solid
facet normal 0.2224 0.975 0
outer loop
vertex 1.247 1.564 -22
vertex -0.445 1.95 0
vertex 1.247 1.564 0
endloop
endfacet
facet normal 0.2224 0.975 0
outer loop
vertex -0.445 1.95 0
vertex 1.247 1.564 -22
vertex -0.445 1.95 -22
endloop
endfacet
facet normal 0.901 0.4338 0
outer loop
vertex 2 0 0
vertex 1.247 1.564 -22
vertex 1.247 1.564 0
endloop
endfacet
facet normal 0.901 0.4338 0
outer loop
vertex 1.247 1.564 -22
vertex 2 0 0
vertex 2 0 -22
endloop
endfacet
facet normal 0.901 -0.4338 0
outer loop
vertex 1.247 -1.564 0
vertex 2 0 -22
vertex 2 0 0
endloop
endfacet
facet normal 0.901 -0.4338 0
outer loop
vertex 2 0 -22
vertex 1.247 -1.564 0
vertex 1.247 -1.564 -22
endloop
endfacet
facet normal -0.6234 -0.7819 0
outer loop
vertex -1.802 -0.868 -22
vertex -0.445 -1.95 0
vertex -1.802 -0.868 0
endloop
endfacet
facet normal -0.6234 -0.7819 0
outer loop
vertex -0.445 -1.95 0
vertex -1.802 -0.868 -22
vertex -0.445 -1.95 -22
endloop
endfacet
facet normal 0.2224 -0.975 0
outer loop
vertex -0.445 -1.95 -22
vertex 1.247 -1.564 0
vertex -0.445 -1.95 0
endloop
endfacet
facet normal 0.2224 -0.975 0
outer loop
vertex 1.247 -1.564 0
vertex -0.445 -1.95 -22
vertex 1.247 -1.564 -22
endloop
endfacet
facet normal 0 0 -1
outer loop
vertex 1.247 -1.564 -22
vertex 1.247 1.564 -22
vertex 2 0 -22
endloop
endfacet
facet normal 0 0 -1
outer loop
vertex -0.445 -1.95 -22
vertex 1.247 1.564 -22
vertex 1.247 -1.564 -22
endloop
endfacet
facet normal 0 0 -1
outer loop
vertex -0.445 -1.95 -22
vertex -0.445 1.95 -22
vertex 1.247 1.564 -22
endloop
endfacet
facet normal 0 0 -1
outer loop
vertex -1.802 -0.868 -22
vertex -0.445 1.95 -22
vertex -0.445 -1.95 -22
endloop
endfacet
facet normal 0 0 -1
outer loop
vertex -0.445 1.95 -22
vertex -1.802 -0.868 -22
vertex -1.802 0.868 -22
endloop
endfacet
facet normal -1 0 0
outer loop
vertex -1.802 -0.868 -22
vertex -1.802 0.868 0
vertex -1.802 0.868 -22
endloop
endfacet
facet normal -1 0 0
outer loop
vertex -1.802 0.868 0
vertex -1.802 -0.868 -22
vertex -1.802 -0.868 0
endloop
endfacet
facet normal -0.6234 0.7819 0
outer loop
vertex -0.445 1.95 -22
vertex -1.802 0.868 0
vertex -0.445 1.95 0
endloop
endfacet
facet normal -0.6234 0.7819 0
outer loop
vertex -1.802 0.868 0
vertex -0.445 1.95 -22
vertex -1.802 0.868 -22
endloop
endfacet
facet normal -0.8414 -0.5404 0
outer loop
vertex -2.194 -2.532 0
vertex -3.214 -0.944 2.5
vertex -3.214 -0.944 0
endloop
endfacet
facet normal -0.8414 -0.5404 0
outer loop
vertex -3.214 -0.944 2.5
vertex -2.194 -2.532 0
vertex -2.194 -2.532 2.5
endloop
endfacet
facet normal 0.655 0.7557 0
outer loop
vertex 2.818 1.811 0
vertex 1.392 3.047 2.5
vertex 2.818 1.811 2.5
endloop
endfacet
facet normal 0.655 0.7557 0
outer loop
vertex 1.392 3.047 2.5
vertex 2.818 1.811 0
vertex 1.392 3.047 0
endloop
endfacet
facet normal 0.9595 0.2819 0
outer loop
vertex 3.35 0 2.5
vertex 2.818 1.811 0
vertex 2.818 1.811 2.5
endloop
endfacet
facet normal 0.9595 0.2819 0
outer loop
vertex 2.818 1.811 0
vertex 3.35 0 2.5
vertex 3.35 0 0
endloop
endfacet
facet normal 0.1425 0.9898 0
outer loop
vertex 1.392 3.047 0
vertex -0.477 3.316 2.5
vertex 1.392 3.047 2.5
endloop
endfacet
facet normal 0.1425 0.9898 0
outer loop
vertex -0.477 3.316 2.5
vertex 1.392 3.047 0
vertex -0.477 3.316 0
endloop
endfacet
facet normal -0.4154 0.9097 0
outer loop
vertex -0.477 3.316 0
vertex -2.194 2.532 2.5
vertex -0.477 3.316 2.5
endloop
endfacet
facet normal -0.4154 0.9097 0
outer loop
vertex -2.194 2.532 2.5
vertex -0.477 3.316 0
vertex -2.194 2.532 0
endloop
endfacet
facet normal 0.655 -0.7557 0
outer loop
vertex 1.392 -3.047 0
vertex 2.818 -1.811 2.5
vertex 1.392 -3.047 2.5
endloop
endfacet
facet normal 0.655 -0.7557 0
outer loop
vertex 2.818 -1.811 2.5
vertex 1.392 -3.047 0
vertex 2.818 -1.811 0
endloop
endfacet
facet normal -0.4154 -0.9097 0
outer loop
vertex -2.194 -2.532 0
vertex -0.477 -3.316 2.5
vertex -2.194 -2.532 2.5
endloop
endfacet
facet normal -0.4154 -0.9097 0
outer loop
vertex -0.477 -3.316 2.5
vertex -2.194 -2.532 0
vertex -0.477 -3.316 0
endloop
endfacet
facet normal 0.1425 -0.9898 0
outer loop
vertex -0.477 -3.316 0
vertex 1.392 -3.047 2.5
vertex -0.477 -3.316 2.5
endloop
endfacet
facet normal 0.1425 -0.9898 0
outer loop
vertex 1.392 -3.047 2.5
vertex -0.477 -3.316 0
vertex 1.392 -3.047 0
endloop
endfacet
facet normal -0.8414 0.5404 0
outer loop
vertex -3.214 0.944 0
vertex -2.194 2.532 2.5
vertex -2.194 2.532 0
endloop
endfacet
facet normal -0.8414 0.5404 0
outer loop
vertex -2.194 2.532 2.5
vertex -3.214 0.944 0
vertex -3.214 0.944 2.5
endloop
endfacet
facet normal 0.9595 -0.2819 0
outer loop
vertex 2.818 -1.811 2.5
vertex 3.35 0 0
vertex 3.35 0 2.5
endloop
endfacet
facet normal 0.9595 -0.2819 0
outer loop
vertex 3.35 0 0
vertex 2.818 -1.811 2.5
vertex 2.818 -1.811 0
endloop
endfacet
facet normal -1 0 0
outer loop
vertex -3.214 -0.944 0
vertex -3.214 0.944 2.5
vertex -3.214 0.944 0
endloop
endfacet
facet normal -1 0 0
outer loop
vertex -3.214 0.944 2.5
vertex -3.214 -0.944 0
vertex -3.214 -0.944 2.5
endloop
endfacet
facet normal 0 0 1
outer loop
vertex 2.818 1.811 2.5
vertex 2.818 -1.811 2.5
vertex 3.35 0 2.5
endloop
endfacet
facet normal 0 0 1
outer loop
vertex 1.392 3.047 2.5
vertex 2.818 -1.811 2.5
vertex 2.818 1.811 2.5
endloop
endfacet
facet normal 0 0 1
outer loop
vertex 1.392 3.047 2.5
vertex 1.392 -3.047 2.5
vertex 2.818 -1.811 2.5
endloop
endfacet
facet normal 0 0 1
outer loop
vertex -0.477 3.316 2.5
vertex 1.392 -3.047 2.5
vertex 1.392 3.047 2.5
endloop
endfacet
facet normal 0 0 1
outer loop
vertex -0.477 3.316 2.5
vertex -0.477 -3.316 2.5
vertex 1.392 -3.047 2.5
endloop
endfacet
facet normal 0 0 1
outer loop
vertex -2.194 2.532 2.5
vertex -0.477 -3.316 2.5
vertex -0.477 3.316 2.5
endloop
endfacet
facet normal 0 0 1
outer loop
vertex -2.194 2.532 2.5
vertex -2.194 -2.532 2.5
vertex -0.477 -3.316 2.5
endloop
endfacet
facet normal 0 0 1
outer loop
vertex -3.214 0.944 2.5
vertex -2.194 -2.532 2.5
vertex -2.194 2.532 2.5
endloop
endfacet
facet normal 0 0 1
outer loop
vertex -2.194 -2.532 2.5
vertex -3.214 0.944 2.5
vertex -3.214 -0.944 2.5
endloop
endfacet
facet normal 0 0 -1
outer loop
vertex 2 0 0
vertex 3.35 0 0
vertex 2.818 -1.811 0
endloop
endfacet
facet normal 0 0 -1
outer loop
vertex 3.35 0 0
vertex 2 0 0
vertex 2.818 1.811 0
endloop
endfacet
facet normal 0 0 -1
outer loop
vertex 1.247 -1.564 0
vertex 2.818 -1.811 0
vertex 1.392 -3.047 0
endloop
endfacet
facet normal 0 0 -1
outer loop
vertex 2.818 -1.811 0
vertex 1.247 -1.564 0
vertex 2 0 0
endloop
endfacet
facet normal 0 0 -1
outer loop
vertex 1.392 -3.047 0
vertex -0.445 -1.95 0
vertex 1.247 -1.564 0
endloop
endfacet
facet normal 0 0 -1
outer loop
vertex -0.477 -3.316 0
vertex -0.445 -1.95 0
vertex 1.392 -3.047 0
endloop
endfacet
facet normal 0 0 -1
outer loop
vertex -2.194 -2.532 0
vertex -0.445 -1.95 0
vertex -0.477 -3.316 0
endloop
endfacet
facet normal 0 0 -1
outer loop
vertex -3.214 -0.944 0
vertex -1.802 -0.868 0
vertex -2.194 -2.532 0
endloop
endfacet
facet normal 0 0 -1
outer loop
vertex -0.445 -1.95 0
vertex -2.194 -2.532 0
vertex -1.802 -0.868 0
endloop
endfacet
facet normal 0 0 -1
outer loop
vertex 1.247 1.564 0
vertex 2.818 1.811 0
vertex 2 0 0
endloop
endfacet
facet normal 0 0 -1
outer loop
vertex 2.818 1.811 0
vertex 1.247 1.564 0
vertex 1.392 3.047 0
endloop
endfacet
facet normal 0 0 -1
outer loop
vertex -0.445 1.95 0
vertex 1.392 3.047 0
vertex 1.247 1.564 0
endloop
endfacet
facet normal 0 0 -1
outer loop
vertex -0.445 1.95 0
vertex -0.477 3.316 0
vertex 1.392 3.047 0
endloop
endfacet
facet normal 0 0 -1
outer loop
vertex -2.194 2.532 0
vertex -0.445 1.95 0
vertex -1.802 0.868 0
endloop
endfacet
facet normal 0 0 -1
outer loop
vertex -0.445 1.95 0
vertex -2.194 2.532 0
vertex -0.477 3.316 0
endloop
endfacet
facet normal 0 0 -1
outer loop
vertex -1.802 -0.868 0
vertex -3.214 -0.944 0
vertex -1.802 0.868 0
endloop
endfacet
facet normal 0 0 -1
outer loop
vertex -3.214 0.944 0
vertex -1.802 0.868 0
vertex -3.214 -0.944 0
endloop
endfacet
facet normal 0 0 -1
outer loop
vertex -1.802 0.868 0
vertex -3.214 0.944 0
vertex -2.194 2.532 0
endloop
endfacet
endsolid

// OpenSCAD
function HiLoScrewDiameter()= 3.6;  
function HiLoScrewLength()= 22;
function HiLoScrewHeadDiameter()= 6.7;
function HiLoScrewHeadHeight()= 2.5;

//err on the side of smaller tolerances for screws

module HiLoScrew(3dPrinterTolerance=.4)
{
	union()
	{
		translate([0,0,-HiLoScrewLength()])
		{
			cylinder(HiLoScrewLength()+3dPrinterTolerance, (HiLoScrewDiameter()+3dPrinterTolerance)/2, (HiLoScrewDiameter()+3dPrinterTolerance)/2);
		}
		cylinder(HiLoScrewHeadHeight(), HiLoScrewHeadDiameter()/2,HiLoScrewHeadDiameter()/2);
	}
}

HiLoScrew();
